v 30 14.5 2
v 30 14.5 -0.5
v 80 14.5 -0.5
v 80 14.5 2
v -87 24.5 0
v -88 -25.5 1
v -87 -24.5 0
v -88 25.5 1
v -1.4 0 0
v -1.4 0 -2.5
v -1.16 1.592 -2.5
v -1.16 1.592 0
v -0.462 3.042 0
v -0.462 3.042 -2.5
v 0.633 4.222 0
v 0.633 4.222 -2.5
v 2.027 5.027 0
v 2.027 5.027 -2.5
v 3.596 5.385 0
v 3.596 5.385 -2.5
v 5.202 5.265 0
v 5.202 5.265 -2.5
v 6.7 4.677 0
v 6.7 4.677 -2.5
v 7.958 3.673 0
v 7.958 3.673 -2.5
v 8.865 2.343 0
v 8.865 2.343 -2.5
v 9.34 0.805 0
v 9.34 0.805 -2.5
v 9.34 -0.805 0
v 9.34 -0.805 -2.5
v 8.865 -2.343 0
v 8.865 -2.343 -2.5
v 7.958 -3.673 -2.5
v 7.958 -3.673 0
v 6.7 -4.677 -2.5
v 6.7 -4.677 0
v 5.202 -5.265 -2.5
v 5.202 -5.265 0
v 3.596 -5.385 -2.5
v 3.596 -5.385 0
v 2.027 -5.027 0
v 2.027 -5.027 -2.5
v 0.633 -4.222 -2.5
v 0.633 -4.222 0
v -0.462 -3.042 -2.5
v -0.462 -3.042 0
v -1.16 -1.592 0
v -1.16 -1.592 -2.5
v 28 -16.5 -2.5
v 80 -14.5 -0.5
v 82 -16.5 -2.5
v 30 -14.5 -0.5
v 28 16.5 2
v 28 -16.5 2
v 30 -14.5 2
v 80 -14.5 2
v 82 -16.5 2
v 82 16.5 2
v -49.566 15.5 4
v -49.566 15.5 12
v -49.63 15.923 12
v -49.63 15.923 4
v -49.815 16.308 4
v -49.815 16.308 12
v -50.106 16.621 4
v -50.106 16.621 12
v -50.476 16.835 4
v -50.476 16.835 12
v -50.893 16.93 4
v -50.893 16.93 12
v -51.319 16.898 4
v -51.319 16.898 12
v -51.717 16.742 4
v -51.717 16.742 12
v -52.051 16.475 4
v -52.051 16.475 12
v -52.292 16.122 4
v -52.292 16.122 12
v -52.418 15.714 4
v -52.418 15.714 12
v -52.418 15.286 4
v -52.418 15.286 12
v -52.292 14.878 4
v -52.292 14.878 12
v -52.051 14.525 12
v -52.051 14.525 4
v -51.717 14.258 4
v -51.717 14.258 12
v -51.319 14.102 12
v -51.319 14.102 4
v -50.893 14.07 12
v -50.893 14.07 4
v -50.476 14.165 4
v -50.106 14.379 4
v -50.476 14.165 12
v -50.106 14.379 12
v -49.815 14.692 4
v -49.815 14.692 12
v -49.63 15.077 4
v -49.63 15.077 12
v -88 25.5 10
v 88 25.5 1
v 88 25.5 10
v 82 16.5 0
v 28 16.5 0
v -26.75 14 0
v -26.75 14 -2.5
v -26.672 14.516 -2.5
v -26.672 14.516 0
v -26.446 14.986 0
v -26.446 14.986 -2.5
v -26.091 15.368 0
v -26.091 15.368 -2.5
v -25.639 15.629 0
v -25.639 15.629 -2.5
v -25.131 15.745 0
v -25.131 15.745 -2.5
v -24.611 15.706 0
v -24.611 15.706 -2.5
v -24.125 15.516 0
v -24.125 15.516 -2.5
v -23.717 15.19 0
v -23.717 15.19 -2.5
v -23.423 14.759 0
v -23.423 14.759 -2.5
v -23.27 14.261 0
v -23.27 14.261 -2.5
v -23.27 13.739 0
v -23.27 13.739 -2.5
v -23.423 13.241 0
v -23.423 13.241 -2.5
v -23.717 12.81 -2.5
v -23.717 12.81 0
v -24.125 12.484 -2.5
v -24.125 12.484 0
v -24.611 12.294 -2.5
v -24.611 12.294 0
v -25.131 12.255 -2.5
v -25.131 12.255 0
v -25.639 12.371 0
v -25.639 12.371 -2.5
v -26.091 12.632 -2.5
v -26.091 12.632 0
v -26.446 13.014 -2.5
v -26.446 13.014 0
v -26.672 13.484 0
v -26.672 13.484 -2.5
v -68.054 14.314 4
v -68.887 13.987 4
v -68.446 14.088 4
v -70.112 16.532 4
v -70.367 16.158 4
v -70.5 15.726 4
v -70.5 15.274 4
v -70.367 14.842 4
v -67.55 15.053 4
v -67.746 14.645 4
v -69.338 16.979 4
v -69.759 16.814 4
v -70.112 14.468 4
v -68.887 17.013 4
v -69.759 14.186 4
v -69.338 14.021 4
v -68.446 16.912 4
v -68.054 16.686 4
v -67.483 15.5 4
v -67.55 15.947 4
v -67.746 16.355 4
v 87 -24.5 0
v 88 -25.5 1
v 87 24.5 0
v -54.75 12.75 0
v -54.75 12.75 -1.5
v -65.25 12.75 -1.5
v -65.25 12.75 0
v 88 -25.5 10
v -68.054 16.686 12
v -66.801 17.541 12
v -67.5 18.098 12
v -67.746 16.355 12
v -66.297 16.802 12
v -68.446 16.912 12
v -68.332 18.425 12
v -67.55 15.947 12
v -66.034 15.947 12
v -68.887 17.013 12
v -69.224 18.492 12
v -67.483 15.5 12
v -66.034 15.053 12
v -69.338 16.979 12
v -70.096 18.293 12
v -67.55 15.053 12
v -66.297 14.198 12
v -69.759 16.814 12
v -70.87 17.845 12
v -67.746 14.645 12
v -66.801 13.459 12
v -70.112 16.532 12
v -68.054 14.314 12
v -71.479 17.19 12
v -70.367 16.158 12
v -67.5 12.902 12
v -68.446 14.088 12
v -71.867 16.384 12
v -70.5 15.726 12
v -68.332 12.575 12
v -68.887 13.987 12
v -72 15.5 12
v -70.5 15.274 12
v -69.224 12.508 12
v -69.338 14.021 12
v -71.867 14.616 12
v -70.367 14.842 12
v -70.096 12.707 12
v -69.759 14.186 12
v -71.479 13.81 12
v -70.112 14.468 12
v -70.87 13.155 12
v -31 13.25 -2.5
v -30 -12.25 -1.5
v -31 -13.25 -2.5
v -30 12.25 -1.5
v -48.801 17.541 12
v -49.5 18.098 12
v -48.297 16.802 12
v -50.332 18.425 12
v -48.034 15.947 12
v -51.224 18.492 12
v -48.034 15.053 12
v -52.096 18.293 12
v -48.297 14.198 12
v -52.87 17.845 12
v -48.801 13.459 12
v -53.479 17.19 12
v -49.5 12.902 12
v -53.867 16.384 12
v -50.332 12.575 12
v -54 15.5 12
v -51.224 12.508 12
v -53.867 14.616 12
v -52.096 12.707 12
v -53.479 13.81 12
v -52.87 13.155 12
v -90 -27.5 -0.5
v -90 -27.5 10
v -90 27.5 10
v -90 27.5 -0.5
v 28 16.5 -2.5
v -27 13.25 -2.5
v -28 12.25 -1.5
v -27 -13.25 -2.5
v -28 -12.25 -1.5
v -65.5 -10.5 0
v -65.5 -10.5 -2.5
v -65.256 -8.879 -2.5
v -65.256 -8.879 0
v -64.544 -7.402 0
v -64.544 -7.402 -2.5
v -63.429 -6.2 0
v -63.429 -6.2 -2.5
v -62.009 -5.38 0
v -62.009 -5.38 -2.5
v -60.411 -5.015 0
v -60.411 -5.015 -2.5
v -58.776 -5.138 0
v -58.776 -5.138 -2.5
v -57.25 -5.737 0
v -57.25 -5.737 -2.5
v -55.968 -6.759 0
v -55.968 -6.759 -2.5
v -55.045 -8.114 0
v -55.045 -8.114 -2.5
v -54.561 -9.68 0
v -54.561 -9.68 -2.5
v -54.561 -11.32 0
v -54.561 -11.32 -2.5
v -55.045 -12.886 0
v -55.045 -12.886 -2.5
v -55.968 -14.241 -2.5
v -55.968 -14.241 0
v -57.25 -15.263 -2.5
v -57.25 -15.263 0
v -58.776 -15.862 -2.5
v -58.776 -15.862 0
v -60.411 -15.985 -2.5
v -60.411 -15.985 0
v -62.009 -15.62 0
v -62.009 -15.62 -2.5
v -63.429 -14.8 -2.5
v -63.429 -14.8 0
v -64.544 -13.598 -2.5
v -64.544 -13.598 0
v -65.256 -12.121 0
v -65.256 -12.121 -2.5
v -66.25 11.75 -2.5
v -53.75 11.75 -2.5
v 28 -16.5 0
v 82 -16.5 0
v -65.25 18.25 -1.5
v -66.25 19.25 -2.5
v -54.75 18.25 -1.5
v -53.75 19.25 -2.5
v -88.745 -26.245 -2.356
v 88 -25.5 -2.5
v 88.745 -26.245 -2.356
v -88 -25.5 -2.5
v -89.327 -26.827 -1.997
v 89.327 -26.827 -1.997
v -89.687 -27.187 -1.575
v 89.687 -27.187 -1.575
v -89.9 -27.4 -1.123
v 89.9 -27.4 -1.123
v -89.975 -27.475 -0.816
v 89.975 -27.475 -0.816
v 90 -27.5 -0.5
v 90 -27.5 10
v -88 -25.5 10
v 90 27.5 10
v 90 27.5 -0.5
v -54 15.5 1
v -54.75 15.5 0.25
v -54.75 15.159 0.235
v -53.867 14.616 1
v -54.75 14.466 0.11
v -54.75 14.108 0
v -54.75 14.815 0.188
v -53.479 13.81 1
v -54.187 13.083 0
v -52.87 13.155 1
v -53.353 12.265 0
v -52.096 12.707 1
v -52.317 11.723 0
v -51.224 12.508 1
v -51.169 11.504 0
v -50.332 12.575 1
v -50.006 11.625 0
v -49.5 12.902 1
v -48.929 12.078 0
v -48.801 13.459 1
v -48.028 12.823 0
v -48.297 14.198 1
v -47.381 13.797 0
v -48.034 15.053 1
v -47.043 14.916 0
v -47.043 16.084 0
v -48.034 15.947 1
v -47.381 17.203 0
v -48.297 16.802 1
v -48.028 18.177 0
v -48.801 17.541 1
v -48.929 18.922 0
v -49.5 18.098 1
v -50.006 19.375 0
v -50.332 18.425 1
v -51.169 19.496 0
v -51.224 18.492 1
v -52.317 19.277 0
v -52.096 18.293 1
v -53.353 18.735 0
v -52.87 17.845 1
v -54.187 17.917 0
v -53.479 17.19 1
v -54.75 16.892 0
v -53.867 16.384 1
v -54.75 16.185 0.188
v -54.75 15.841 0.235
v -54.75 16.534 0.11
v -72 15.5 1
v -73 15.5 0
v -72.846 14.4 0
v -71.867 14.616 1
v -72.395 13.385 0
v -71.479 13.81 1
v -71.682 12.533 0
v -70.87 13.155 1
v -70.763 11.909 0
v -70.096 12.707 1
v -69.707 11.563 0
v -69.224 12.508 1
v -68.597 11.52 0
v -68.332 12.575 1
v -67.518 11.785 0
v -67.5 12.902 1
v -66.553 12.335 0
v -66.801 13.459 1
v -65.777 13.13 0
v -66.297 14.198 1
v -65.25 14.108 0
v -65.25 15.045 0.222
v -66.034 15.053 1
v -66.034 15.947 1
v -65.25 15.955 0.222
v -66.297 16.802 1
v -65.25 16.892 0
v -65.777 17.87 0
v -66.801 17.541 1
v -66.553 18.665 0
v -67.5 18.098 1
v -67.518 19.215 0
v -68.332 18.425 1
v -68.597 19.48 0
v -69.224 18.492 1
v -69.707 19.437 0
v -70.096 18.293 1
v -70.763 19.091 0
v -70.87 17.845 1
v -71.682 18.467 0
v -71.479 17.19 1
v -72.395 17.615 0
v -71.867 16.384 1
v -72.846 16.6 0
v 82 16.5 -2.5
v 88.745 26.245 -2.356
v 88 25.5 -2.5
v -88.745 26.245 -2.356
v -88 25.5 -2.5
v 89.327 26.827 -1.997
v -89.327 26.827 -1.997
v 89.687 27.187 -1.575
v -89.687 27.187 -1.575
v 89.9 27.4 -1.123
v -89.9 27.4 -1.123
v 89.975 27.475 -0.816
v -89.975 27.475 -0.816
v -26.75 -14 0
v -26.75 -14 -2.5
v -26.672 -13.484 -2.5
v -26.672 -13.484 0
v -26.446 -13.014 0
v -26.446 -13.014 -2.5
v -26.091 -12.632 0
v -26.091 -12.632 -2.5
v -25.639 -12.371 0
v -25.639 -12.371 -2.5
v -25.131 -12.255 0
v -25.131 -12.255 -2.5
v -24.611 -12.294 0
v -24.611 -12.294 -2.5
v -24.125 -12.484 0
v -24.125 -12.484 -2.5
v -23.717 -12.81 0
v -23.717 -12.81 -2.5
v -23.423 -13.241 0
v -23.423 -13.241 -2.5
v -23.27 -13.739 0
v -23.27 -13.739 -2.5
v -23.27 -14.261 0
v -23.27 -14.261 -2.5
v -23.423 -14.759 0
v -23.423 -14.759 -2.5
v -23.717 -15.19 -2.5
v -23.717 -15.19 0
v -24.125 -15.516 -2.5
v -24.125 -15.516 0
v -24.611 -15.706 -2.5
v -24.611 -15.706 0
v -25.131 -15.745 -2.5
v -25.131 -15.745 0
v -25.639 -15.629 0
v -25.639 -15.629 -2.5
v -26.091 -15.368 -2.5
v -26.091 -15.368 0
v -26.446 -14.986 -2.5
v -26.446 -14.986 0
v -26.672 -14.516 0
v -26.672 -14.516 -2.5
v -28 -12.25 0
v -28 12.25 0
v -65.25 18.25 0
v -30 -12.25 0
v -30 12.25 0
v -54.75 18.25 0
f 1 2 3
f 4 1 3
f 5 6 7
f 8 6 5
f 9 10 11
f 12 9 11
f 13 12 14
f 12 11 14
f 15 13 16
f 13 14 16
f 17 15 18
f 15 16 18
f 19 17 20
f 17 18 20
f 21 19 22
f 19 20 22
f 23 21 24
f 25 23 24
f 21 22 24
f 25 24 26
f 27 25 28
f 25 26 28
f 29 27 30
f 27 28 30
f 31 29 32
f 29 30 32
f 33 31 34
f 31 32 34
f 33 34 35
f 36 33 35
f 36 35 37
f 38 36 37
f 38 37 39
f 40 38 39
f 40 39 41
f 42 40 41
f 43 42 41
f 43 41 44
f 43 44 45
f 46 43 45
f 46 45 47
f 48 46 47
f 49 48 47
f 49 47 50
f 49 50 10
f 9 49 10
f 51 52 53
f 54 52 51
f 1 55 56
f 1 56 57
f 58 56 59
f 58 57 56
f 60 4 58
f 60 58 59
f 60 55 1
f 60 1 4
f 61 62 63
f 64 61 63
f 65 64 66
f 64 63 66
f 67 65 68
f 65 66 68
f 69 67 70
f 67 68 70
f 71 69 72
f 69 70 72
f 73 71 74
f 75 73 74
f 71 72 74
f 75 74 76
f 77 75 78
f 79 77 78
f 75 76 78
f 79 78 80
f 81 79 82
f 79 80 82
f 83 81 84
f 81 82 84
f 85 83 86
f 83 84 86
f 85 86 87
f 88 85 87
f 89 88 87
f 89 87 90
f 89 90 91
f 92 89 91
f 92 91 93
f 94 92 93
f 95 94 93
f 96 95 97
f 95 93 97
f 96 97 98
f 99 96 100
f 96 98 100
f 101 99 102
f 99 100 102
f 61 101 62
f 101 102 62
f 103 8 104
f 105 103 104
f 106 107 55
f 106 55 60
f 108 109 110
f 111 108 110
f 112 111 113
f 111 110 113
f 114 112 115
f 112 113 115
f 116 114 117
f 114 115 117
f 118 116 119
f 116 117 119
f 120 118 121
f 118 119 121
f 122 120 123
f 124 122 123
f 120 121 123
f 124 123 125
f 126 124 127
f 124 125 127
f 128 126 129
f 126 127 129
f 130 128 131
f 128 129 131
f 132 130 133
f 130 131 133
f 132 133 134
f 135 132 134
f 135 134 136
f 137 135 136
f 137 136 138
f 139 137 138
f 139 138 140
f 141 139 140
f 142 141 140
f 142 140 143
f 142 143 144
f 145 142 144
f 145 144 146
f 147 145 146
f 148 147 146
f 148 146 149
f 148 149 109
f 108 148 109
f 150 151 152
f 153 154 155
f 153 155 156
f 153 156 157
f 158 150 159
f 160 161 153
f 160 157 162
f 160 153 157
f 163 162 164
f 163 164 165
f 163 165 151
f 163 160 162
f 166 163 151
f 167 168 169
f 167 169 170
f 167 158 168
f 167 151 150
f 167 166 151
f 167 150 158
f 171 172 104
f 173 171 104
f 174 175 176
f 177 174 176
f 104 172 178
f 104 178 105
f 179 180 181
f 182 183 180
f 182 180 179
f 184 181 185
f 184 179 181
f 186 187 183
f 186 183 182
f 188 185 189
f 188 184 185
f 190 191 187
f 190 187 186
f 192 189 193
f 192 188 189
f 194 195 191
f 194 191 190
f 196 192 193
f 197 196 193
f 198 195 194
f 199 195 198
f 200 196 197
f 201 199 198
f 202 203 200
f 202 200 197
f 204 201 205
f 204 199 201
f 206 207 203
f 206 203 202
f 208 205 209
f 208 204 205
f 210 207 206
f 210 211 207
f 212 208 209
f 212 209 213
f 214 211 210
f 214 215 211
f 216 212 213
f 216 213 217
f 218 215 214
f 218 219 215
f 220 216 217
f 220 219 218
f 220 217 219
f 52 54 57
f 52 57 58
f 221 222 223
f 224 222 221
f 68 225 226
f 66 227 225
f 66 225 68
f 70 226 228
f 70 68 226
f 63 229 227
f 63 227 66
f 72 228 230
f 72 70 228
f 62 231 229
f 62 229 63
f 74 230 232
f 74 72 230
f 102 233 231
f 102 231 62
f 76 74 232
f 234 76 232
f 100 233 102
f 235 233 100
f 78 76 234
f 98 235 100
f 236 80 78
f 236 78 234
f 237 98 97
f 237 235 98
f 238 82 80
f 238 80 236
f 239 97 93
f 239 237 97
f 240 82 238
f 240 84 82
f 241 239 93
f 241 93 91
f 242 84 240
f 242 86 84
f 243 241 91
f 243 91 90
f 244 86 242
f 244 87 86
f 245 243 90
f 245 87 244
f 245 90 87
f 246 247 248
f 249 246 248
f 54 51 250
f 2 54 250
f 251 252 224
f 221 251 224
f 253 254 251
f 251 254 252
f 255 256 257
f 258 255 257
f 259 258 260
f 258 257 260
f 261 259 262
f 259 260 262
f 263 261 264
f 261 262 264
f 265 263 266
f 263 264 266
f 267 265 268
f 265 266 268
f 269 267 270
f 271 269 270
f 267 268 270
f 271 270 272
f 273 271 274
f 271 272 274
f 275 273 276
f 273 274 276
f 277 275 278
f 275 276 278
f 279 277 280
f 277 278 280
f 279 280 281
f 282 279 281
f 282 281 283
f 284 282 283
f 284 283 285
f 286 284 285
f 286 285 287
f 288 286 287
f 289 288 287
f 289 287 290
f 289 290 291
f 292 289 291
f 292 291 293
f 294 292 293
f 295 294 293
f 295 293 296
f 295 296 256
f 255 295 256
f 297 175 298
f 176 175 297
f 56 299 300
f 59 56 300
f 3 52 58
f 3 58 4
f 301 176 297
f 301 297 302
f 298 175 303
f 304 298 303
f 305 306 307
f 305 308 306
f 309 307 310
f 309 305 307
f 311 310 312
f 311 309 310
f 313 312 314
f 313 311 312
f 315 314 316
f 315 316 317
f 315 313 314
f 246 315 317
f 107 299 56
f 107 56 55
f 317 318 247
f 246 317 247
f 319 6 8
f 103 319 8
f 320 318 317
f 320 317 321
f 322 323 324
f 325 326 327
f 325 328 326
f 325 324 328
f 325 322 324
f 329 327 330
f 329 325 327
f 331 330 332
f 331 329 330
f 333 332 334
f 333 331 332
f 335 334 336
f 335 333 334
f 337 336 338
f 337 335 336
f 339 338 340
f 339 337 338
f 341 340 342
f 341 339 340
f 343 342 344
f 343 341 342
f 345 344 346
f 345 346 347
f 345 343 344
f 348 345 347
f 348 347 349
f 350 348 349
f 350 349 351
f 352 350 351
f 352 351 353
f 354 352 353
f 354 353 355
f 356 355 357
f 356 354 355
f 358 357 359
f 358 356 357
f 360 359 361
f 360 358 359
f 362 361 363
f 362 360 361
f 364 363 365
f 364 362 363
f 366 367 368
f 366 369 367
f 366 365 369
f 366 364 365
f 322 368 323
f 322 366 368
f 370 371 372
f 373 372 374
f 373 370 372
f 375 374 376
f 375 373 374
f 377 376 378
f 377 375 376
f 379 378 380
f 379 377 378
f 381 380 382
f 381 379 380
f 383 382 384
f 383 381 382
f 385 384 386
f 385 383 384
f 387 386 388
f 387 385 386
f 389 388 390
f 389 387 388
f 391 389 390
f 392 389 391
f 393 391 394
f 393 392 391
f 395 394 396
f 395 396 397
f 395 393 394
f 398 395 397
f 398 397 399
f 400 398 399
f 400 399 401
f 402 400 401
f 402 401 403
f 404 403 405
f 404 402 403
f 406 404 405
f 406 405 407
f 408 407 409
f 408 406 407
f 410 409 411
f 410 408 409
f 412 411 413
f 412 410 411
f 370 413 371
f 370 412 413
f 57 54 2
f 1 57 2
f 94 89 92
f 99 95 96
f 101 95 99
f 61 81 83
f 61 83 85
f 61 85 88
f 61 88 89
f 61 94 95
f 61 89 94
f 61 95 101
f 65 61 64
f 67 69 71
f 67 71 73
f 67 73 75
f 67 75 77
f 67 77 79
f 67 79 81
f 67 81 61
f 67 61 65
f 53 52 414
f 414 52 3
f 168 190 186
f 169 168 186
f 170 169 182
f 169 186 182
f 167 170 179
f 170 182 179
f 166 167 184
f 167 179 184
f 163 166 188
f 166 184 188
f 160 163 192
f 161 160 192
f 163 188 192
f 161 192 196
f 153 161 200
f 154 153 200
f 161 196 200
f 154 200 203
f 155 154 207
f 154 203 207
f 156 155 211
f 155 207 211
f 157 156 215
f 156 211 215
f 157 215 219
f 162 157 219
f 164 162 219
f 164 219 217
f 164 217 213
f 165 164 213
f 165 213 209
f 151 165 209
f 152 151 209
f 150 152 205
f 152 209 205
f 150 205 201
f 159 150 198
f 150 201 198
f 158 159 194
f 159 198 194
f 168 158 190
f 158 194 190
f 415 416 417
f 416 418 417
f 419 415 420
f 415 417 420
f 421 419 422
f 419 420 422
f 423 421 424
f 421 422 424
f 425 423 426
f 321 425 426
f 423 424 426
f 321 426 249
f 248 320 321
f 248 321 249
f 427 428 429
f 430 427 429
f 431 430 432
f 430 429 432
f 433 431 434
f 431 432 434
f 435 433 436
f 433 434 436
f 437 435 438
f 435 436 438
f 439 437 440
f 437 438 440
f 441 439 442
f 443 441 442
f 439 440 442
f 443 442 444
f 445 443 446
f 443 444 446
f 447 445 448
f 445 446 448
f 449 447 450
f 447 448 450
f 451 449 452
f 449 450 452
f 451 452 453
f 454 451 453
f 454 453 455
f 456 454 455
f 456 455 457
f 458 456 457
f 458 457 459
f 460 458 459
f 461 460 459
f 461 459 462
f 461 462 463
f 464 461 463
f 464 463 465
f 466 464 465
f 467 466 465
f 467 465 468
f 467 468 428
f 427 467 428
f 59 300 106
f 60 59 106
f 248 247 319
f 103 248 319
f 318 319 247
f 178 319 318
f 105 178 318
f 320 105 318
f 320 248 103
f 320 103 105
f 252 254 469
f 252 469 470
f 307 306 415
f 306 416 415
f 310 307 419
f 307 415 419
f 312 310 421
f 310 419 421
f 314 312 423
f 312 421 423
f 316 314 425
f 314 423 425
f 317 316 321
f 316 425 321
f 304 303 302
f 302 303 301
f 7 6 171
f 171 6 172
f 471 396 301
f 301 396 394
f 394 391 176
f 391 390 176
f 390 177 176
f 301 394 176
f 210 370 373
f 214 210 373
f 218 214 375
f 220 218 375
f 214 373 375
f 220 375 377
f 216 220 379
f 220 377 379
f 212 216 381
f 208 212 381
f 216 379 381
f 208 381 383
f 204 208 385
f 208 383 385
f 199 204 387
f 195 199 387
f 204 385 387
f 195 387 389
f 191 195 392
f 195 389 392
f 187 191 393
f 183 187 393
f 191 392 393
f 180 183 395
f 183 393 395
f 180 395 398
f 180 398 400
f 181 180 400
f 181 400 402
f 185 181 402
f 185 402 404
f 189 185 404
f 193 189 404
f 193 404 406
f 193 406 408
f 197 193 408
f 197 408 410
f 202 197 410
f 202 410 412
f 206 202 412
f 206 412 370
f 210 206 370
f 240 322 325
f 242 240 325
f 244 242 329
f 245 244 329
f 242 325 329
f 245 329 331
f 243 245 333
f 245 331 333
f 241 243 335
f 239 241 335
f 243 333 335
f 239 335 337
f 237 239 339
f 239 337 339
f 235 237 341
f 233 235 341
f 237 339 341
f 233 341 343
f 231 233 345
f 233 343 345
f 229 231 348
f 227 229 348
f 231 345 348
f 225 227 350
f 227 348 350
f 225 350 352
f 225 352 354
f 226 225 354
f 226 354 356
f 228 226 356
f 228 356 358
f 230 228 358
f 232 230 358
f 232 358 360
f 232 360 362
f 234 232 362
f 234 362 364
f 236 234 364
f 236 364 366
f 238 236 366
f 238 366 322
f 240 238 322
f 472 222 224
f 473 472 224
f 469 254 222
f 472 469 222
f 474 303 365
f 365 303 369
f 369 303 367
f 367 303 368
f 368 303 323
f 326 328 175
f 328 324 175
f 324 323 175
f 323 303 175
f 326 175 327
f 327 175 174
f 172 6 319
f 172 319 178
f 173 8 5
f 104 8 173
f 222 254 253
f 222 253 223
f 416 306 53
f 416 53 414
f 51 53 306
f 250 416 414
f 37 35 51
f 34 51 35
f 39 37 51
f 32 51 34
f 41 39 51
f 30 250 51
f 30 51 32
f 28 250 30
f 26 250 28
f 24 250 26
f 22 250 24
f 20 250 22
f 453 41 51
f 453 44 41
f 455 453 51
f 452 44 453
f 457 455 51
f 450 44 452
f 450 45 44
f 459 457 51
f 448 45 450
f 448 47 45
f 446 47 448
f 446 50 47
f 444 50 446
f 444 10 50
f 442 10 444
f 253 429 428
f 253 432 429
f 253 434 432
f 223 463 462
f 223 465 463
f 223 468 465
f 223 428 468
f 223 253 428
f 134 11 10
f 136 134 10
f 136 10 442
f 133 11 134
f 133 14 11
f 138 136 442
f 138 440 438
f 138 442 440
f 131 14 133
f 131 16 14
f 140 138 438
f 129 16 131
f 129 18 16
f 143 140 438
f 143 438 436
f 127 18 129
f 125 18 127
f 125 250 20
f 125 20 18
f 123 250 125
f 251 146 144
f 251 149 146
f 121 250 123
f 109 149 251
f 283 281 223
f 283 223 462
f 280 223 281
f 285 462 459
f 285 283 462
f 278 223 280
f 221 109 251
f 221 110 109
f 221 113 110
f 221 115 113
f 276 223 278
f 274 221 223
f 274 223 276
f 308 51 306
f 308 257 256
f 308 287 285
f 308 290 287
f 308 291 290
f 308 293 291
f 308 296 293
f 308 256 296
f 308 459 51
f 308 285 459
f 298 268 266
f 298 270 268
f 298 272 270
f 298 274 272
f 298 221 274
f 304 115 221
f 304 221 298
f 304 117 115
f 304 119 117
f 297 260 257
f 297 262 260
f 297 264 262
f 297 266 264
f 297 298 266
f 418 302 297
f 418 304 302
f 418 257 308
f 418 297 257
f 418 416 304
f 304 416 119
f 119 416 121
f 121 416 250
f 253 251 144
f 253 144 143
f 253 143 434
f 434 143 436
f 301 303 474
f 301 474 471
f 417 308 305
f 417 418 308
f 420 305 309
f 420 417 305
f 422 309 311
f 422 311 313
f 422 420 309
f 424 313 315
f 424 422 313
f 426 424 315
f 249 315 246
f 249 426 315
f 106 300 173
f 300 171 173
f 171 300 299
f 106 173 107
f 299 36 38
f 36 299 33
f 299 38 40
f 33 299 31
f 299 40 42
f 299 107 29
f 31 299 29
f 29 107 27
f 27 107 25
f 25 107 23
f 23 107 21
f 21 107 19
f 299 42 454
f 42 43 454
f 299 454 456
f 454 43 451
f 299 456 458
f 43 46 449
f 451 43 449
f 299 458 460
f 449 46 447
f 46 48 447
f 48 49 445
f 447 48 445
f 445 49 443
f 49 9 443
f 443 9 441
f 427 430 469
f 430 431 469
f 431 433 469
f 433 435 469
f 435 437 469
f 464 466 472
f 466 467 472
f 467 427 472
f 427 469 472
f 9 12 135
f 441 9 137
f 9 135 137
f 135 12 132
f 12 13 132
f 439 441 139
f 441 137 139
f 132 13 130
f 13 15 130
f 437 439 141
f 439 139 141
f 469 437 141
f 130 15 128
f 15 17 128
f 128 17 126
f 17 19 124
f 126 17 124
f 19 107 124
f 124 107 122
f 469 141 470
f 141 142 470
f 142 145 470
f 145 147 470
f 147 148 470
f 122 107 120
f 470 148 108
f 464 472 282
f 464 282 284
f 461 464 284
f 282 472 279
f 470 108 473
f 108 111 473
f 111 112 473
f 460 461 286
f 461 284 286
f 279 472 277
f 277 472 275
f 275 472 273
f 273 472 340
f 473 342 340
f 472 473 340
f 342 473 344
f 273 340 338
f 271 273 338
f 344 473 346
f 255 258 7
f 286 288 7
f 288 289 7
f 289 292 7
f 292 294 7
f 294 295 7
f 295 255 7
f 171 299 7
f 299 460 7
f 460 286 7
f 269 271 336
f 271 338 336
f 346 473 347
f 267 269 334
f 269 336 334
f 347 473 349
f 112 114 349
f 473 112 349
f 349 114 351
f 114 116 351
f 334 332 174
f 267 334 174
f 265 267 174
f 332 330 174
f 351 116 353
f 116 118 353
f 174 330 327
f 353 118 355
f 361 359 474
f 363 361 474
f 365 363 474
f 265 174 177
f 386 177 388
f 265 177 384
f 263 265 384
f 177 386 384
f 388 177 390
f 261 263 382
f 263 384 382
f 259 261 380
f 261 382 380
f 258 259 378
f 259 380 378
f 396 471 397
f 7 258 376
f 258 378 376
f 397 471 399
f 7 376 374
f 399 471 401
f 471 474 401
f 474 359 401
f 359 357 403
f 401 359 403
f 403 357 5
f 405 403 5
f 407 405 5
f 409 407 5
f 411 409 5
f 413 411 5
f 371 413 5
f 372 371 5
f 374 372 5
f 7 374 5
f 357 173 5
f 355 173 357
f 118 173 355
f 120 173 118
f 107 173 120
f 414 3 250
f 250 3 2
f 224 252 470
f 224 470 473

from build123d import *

# Parameters (mm, degrees)
SKETCH_1_W          = 180
SKETCH_1_H          = 55
SKETCH_1_W_2        = 176
SKETCH_1_H_2        = 51
EXTRUDE_1_DEPTH     = 10
SKETCH_4_W          = 180
SKETCH_4_H          = 55
EXTRUDE_2_DEPTH     = 2.5
SKETCH_5_W          = 10.5
SKETCH_5_H          = 5.5
CUT_EXTRUDE_1_DEPTH = 2.5
SKETCH_7_R          = 3
EXTRUDE_3_DEPTH     = 12
SKETCH_8_R          = 1.517316024
SKETCH_8_R_2        = 1.4341078
CUT_EXTRUDE_2_DEPTH = 8
SKETCH_9_R          = 5.5
CUT_EXTRUDE_3_DEPTH = 8
SKETCH_10_R         = 1.75
CUT_EXTRUDE_4_DEPTH = 8
SKETCH_12_W         = 2
SKETCH_12_H         = 24.5
CUT_EXTRUDE_5_DEPTH = 8
SKETCH_13_R         = 5.4
CUT_EXTRUDE_6_DEPTH = 8
SKETCH_15_W         = 50
SKETCH_15_H         = 29
CUT_EXTRUDE_7_DEPTH = 8
SKETCH_16_W         = 54
SKETCH_16_H         = 33
SKETCH_16_W_2       = 50
SKETCH_16_H_2       = 29
EXTRUDE_2_2_DEPTH   = 2
CHAMFER_1_SIZE      = 2
CHAMFER_2_SIZE      = 1
CHAMFER_3_SIZE      = 1
CHAMFER_4_SIZE      = 1
CHAMFER_5_SIZE      = 1
FILLET_1_R          = 2


with BuildPart() as part:
    # Эскиз1 → Вытянуть-Тонкостенный1 (new body)
    with BuildSketch(Plane.XY):
        Rectangle(SKETCH_1_W, SKETCH_1_H)
        Rectangle(SKETCH_1_W_2, SKETCH_1_H_2, mode=Mode.SUBTRACT)
    extrude(amount=EXTRUDE_1_DEPTH)

    # Эскиз4 → Extrude 2 (add)
    with BuildSketch(Plane(origin=(0, 0, 0), x_dir=(-1, 0, 0), z_dir=(0, 0, -1))):
        Rectangle(SKETCH_4_W, SKETCH_4_H)
    extrude(amount=EXTRUDE_2_DEPTH)

    # Эскиз5 → Вырез-Вытянуть1 (cut)
    with BuildSketch(Plane(origin=(0, 0, -2.5), x_dir=(-1, 0, 0), z_dir=(0, 0, -1))):
        with Locations((60, 15.5)):
            Rectangle(SKETCH_5_W, SKETCH_5_H)
    extrude(amount=-CUT_EXTRUDE_1_DEPTH, mode=Mode.SUBTRACT)

    # Эскиз7 → Бобышка-Вытянуть3 (add)
    with BuildSketch(Plane.XY):
        with Locations(Location((-51, 15.5, 0), (0, 0, 180))):
            Circle(SKETCH_7_R)
        with Locations(Location((-69, 15.5, 0), (0, 0, 180))):
            Circle(SKETCH_7_R)
    extrude(amount=EXTRUDE_3_DEPTH)

    # Эскиз8 → Вырез-Вытянуть2 (cut)
    with BuildSketch(Plane.XY.offset(12)):
        with Locations((-69, 15.5)):
            Circle(SKETCH_8_R)
        with Locations((-51, 15.5)):
            Circle(SKETCH_8_R_2)
    extrude(amount=-CUT_EXTRUDE_2_DEPTH, mode=Mode.SUBTRACT)

    # Эскиз9 → Вырез-Вытянуть3 (cut)
    with BuildSketch(Plane(origin=(0, 0, -2.5), x_dir=(-1, 0, 0), z_dir=(0, 0, -1))):
        with Locations((60, -10.5)):
            Circle(SKETCH_9_R)
    extrude(amount=-CUT_EXTRUDE_3_DEPTH, mode=Mode.SUBTRACT)

    # Эскиз10 → Вырез-Вытянуть4 (cut)
    with BuildSketch(Plane(origin=(0, 0, -2.5), x_dir=(-1, 0, 0), z_dir=(0, 0, -1))):
        with Locations((25, 14)):
            Circle(SKETCH_10_R)
        with Locations((25, -14)):
            Circle(SKETCH_10_R)
    extrude(amount=-CUT_EXTRUDE_4_DEPTH, mode=Mode.SUBTRACT)

    # Эскиз12 → Вырез-Вытянуть5 (cut)
    with BuildSketch(Plane(origin=(0, 0, -2.5), x_dir=(-1, 0, 0), z_dir=(0, 0, -1))):
        with Locations((29, 0)):
            Rectangle(SKETCH_12_W, SKETCH_12_H)
    extrude(amount=-CUT_EXTRUDE_5_DEPTH, mode=Mode.SUBTRACT)

    # Эскиз13 → Вырез-Вытянуть6 (cut)
    with BuildSketch(Plane(origin=(0, 0, -2.5), x_dir=(-1, 0, 0), z_dir=(0, 0, -1))):
        with Locations((-4, 0)):
            Circle(SKETCH_13_R)
    extrude(amount=-CUT_EXTRUDE_6_DEPTH, mode=Mode.SUBTRACT)

    # Эскиз15 → Вырез-Вытянуть7 (cut)
    with BuildSketch(Plane(origin=(0, 0, -2.5), x_dir=(-1, 0, 0), z_dir=(0, 0, -1))):
        with Locations((-55, 0)):
            Rectangle(SKETCH_15_W, SKETCH_15_H)
    extrude(amount=-CUT_EXTRUDE_7_DEPTH, mode=Mode.SUBTRACT)

    # Эскиз16 → Extrude 2 2 (add)
    with BuildSketch(Plane.XY):
        with Locations((55, 0)):
            Rectangle(SKETCH_16_W, SKETCH_16_H)
        with Locations((55, 0)):
            Rectangle(SKETCH_16_W_2, SKETCH_16_H_2, mode=Mode.SUBTRACT)
    extrude(amount=EXTRUDE_2_2_DEPTH)

    # Фаска1
    chamfer_1_edges = [part.edges().sort_by_distance(p)[0] for p in [
        (80, 0, -2.5),
        (55, -14.5, -2.5),
        (30, 0, -2.5),
        (55, 14.5, -2.5),
    ]]
    chamfer(chamfer_1_edges, length=CHAMFER_1_SIZE)

    # Фаска2
    chamfer_2_edges = [part.edges().sort_by_distance(p)[0] for p in [
        (-30, 0, -2.5),
        (-29, 12.25, -2.5),
        (-28, 0, -2.5),
        (-29, -12.25, -2.5),
    ]]
    chamfer(chamfer_2_edges, length=CHAMFER_2_SIZE)

    # Фаска3
    chamfer_3_edges = [part.edges().sort_by_distance(p)[0] for p in [
        (-65.25, 15.5, -2.5),
        (-60, 18.25, -2.5),
        (-54.75, 15.5, -2.5),
        (-60, 12.75, -2.5),
    ]]
    chamfer(chamfer_3_edges, length=CHAMFER_3_SIZE)

    # Фаска4
    # the kernel refuses this chamfer: 1 mm, written as the material it adds along each edge
    with BuildSketch(Plane(origin=(-51, 15.5, 0), x_dir=(-1, 0, 0), z_dir=(0, 1, 0))) as chamfer_4_piece_1_section:
        Polygon((3 + CHAMFER_4_SIZE, 0), (3, CHAMFER_4_SIZE), (3, 0), align=None)
    chamfer_4_piece_1 = revolve(axis=Axis((-51, 15.5, 0), (0, 0, 1)), mode=Mode.PRIVATE)
    chamfer_4_piece_1 = split(chamfer_4_piece_1, bisect_by=Plane(origin=(-54.75, 15.5, 0.484065112), z_dir=(1, 0, 0)), keep=Keep.TOP, mode=Mode.PRIVATE)
    add(chamfer_4_piece_1)
    with BuildSketch(Plane(origin=(-69, 15.5, 0), x_dir=(-1, 0, 0), z_dir=(0, 1, 0))) as chamfer_4_piece_2_section:
        Polygon((3 + CHAMFER_4_SIZE, 0), (3, CHAMFER_4_SIZE), (3, 0), align=None)
    chamfer_4_piece_2 = revolve(axis=Axis((-69, 15.5, 0), (0, 0, 1)), mode=Mode.PRIVATE)
    chamfer_4_piece_2 = split(chamfer_4_piece_2, bisect_by=Plane(origin=(-65.25, 15.5, 0.484065116), z_dir=(-1, 0, 0)), keep=Keep.TOP, mode=Mode.PRIVATE)
    add(chamfer_4_piece_2)

    # Фаска5
    chamfer_5_edges = [part.edges().sort_by_distance(p)[0] for p in [
        (88, 0, 0),
        (0, 25.5, 0),
        (-88, 0, 0),
        (0, -25.5, 0),
    ]]
    chamfer(chamfer_5_edges, length=CHAMFER_5_SIZE)

    # Скругление1
    fillet_1_edges = [part.edges().sort_by_distance(p)[0] for p in [
        (-90, 0, -2.5),
        (0, 27.5, -2.5),
        (90, 0, -2.5),
        (0, -27.5, -2.5),
    ]]
    fillet(fillet_1_edges, radius=FILLET_1_R)


solid = part.part
